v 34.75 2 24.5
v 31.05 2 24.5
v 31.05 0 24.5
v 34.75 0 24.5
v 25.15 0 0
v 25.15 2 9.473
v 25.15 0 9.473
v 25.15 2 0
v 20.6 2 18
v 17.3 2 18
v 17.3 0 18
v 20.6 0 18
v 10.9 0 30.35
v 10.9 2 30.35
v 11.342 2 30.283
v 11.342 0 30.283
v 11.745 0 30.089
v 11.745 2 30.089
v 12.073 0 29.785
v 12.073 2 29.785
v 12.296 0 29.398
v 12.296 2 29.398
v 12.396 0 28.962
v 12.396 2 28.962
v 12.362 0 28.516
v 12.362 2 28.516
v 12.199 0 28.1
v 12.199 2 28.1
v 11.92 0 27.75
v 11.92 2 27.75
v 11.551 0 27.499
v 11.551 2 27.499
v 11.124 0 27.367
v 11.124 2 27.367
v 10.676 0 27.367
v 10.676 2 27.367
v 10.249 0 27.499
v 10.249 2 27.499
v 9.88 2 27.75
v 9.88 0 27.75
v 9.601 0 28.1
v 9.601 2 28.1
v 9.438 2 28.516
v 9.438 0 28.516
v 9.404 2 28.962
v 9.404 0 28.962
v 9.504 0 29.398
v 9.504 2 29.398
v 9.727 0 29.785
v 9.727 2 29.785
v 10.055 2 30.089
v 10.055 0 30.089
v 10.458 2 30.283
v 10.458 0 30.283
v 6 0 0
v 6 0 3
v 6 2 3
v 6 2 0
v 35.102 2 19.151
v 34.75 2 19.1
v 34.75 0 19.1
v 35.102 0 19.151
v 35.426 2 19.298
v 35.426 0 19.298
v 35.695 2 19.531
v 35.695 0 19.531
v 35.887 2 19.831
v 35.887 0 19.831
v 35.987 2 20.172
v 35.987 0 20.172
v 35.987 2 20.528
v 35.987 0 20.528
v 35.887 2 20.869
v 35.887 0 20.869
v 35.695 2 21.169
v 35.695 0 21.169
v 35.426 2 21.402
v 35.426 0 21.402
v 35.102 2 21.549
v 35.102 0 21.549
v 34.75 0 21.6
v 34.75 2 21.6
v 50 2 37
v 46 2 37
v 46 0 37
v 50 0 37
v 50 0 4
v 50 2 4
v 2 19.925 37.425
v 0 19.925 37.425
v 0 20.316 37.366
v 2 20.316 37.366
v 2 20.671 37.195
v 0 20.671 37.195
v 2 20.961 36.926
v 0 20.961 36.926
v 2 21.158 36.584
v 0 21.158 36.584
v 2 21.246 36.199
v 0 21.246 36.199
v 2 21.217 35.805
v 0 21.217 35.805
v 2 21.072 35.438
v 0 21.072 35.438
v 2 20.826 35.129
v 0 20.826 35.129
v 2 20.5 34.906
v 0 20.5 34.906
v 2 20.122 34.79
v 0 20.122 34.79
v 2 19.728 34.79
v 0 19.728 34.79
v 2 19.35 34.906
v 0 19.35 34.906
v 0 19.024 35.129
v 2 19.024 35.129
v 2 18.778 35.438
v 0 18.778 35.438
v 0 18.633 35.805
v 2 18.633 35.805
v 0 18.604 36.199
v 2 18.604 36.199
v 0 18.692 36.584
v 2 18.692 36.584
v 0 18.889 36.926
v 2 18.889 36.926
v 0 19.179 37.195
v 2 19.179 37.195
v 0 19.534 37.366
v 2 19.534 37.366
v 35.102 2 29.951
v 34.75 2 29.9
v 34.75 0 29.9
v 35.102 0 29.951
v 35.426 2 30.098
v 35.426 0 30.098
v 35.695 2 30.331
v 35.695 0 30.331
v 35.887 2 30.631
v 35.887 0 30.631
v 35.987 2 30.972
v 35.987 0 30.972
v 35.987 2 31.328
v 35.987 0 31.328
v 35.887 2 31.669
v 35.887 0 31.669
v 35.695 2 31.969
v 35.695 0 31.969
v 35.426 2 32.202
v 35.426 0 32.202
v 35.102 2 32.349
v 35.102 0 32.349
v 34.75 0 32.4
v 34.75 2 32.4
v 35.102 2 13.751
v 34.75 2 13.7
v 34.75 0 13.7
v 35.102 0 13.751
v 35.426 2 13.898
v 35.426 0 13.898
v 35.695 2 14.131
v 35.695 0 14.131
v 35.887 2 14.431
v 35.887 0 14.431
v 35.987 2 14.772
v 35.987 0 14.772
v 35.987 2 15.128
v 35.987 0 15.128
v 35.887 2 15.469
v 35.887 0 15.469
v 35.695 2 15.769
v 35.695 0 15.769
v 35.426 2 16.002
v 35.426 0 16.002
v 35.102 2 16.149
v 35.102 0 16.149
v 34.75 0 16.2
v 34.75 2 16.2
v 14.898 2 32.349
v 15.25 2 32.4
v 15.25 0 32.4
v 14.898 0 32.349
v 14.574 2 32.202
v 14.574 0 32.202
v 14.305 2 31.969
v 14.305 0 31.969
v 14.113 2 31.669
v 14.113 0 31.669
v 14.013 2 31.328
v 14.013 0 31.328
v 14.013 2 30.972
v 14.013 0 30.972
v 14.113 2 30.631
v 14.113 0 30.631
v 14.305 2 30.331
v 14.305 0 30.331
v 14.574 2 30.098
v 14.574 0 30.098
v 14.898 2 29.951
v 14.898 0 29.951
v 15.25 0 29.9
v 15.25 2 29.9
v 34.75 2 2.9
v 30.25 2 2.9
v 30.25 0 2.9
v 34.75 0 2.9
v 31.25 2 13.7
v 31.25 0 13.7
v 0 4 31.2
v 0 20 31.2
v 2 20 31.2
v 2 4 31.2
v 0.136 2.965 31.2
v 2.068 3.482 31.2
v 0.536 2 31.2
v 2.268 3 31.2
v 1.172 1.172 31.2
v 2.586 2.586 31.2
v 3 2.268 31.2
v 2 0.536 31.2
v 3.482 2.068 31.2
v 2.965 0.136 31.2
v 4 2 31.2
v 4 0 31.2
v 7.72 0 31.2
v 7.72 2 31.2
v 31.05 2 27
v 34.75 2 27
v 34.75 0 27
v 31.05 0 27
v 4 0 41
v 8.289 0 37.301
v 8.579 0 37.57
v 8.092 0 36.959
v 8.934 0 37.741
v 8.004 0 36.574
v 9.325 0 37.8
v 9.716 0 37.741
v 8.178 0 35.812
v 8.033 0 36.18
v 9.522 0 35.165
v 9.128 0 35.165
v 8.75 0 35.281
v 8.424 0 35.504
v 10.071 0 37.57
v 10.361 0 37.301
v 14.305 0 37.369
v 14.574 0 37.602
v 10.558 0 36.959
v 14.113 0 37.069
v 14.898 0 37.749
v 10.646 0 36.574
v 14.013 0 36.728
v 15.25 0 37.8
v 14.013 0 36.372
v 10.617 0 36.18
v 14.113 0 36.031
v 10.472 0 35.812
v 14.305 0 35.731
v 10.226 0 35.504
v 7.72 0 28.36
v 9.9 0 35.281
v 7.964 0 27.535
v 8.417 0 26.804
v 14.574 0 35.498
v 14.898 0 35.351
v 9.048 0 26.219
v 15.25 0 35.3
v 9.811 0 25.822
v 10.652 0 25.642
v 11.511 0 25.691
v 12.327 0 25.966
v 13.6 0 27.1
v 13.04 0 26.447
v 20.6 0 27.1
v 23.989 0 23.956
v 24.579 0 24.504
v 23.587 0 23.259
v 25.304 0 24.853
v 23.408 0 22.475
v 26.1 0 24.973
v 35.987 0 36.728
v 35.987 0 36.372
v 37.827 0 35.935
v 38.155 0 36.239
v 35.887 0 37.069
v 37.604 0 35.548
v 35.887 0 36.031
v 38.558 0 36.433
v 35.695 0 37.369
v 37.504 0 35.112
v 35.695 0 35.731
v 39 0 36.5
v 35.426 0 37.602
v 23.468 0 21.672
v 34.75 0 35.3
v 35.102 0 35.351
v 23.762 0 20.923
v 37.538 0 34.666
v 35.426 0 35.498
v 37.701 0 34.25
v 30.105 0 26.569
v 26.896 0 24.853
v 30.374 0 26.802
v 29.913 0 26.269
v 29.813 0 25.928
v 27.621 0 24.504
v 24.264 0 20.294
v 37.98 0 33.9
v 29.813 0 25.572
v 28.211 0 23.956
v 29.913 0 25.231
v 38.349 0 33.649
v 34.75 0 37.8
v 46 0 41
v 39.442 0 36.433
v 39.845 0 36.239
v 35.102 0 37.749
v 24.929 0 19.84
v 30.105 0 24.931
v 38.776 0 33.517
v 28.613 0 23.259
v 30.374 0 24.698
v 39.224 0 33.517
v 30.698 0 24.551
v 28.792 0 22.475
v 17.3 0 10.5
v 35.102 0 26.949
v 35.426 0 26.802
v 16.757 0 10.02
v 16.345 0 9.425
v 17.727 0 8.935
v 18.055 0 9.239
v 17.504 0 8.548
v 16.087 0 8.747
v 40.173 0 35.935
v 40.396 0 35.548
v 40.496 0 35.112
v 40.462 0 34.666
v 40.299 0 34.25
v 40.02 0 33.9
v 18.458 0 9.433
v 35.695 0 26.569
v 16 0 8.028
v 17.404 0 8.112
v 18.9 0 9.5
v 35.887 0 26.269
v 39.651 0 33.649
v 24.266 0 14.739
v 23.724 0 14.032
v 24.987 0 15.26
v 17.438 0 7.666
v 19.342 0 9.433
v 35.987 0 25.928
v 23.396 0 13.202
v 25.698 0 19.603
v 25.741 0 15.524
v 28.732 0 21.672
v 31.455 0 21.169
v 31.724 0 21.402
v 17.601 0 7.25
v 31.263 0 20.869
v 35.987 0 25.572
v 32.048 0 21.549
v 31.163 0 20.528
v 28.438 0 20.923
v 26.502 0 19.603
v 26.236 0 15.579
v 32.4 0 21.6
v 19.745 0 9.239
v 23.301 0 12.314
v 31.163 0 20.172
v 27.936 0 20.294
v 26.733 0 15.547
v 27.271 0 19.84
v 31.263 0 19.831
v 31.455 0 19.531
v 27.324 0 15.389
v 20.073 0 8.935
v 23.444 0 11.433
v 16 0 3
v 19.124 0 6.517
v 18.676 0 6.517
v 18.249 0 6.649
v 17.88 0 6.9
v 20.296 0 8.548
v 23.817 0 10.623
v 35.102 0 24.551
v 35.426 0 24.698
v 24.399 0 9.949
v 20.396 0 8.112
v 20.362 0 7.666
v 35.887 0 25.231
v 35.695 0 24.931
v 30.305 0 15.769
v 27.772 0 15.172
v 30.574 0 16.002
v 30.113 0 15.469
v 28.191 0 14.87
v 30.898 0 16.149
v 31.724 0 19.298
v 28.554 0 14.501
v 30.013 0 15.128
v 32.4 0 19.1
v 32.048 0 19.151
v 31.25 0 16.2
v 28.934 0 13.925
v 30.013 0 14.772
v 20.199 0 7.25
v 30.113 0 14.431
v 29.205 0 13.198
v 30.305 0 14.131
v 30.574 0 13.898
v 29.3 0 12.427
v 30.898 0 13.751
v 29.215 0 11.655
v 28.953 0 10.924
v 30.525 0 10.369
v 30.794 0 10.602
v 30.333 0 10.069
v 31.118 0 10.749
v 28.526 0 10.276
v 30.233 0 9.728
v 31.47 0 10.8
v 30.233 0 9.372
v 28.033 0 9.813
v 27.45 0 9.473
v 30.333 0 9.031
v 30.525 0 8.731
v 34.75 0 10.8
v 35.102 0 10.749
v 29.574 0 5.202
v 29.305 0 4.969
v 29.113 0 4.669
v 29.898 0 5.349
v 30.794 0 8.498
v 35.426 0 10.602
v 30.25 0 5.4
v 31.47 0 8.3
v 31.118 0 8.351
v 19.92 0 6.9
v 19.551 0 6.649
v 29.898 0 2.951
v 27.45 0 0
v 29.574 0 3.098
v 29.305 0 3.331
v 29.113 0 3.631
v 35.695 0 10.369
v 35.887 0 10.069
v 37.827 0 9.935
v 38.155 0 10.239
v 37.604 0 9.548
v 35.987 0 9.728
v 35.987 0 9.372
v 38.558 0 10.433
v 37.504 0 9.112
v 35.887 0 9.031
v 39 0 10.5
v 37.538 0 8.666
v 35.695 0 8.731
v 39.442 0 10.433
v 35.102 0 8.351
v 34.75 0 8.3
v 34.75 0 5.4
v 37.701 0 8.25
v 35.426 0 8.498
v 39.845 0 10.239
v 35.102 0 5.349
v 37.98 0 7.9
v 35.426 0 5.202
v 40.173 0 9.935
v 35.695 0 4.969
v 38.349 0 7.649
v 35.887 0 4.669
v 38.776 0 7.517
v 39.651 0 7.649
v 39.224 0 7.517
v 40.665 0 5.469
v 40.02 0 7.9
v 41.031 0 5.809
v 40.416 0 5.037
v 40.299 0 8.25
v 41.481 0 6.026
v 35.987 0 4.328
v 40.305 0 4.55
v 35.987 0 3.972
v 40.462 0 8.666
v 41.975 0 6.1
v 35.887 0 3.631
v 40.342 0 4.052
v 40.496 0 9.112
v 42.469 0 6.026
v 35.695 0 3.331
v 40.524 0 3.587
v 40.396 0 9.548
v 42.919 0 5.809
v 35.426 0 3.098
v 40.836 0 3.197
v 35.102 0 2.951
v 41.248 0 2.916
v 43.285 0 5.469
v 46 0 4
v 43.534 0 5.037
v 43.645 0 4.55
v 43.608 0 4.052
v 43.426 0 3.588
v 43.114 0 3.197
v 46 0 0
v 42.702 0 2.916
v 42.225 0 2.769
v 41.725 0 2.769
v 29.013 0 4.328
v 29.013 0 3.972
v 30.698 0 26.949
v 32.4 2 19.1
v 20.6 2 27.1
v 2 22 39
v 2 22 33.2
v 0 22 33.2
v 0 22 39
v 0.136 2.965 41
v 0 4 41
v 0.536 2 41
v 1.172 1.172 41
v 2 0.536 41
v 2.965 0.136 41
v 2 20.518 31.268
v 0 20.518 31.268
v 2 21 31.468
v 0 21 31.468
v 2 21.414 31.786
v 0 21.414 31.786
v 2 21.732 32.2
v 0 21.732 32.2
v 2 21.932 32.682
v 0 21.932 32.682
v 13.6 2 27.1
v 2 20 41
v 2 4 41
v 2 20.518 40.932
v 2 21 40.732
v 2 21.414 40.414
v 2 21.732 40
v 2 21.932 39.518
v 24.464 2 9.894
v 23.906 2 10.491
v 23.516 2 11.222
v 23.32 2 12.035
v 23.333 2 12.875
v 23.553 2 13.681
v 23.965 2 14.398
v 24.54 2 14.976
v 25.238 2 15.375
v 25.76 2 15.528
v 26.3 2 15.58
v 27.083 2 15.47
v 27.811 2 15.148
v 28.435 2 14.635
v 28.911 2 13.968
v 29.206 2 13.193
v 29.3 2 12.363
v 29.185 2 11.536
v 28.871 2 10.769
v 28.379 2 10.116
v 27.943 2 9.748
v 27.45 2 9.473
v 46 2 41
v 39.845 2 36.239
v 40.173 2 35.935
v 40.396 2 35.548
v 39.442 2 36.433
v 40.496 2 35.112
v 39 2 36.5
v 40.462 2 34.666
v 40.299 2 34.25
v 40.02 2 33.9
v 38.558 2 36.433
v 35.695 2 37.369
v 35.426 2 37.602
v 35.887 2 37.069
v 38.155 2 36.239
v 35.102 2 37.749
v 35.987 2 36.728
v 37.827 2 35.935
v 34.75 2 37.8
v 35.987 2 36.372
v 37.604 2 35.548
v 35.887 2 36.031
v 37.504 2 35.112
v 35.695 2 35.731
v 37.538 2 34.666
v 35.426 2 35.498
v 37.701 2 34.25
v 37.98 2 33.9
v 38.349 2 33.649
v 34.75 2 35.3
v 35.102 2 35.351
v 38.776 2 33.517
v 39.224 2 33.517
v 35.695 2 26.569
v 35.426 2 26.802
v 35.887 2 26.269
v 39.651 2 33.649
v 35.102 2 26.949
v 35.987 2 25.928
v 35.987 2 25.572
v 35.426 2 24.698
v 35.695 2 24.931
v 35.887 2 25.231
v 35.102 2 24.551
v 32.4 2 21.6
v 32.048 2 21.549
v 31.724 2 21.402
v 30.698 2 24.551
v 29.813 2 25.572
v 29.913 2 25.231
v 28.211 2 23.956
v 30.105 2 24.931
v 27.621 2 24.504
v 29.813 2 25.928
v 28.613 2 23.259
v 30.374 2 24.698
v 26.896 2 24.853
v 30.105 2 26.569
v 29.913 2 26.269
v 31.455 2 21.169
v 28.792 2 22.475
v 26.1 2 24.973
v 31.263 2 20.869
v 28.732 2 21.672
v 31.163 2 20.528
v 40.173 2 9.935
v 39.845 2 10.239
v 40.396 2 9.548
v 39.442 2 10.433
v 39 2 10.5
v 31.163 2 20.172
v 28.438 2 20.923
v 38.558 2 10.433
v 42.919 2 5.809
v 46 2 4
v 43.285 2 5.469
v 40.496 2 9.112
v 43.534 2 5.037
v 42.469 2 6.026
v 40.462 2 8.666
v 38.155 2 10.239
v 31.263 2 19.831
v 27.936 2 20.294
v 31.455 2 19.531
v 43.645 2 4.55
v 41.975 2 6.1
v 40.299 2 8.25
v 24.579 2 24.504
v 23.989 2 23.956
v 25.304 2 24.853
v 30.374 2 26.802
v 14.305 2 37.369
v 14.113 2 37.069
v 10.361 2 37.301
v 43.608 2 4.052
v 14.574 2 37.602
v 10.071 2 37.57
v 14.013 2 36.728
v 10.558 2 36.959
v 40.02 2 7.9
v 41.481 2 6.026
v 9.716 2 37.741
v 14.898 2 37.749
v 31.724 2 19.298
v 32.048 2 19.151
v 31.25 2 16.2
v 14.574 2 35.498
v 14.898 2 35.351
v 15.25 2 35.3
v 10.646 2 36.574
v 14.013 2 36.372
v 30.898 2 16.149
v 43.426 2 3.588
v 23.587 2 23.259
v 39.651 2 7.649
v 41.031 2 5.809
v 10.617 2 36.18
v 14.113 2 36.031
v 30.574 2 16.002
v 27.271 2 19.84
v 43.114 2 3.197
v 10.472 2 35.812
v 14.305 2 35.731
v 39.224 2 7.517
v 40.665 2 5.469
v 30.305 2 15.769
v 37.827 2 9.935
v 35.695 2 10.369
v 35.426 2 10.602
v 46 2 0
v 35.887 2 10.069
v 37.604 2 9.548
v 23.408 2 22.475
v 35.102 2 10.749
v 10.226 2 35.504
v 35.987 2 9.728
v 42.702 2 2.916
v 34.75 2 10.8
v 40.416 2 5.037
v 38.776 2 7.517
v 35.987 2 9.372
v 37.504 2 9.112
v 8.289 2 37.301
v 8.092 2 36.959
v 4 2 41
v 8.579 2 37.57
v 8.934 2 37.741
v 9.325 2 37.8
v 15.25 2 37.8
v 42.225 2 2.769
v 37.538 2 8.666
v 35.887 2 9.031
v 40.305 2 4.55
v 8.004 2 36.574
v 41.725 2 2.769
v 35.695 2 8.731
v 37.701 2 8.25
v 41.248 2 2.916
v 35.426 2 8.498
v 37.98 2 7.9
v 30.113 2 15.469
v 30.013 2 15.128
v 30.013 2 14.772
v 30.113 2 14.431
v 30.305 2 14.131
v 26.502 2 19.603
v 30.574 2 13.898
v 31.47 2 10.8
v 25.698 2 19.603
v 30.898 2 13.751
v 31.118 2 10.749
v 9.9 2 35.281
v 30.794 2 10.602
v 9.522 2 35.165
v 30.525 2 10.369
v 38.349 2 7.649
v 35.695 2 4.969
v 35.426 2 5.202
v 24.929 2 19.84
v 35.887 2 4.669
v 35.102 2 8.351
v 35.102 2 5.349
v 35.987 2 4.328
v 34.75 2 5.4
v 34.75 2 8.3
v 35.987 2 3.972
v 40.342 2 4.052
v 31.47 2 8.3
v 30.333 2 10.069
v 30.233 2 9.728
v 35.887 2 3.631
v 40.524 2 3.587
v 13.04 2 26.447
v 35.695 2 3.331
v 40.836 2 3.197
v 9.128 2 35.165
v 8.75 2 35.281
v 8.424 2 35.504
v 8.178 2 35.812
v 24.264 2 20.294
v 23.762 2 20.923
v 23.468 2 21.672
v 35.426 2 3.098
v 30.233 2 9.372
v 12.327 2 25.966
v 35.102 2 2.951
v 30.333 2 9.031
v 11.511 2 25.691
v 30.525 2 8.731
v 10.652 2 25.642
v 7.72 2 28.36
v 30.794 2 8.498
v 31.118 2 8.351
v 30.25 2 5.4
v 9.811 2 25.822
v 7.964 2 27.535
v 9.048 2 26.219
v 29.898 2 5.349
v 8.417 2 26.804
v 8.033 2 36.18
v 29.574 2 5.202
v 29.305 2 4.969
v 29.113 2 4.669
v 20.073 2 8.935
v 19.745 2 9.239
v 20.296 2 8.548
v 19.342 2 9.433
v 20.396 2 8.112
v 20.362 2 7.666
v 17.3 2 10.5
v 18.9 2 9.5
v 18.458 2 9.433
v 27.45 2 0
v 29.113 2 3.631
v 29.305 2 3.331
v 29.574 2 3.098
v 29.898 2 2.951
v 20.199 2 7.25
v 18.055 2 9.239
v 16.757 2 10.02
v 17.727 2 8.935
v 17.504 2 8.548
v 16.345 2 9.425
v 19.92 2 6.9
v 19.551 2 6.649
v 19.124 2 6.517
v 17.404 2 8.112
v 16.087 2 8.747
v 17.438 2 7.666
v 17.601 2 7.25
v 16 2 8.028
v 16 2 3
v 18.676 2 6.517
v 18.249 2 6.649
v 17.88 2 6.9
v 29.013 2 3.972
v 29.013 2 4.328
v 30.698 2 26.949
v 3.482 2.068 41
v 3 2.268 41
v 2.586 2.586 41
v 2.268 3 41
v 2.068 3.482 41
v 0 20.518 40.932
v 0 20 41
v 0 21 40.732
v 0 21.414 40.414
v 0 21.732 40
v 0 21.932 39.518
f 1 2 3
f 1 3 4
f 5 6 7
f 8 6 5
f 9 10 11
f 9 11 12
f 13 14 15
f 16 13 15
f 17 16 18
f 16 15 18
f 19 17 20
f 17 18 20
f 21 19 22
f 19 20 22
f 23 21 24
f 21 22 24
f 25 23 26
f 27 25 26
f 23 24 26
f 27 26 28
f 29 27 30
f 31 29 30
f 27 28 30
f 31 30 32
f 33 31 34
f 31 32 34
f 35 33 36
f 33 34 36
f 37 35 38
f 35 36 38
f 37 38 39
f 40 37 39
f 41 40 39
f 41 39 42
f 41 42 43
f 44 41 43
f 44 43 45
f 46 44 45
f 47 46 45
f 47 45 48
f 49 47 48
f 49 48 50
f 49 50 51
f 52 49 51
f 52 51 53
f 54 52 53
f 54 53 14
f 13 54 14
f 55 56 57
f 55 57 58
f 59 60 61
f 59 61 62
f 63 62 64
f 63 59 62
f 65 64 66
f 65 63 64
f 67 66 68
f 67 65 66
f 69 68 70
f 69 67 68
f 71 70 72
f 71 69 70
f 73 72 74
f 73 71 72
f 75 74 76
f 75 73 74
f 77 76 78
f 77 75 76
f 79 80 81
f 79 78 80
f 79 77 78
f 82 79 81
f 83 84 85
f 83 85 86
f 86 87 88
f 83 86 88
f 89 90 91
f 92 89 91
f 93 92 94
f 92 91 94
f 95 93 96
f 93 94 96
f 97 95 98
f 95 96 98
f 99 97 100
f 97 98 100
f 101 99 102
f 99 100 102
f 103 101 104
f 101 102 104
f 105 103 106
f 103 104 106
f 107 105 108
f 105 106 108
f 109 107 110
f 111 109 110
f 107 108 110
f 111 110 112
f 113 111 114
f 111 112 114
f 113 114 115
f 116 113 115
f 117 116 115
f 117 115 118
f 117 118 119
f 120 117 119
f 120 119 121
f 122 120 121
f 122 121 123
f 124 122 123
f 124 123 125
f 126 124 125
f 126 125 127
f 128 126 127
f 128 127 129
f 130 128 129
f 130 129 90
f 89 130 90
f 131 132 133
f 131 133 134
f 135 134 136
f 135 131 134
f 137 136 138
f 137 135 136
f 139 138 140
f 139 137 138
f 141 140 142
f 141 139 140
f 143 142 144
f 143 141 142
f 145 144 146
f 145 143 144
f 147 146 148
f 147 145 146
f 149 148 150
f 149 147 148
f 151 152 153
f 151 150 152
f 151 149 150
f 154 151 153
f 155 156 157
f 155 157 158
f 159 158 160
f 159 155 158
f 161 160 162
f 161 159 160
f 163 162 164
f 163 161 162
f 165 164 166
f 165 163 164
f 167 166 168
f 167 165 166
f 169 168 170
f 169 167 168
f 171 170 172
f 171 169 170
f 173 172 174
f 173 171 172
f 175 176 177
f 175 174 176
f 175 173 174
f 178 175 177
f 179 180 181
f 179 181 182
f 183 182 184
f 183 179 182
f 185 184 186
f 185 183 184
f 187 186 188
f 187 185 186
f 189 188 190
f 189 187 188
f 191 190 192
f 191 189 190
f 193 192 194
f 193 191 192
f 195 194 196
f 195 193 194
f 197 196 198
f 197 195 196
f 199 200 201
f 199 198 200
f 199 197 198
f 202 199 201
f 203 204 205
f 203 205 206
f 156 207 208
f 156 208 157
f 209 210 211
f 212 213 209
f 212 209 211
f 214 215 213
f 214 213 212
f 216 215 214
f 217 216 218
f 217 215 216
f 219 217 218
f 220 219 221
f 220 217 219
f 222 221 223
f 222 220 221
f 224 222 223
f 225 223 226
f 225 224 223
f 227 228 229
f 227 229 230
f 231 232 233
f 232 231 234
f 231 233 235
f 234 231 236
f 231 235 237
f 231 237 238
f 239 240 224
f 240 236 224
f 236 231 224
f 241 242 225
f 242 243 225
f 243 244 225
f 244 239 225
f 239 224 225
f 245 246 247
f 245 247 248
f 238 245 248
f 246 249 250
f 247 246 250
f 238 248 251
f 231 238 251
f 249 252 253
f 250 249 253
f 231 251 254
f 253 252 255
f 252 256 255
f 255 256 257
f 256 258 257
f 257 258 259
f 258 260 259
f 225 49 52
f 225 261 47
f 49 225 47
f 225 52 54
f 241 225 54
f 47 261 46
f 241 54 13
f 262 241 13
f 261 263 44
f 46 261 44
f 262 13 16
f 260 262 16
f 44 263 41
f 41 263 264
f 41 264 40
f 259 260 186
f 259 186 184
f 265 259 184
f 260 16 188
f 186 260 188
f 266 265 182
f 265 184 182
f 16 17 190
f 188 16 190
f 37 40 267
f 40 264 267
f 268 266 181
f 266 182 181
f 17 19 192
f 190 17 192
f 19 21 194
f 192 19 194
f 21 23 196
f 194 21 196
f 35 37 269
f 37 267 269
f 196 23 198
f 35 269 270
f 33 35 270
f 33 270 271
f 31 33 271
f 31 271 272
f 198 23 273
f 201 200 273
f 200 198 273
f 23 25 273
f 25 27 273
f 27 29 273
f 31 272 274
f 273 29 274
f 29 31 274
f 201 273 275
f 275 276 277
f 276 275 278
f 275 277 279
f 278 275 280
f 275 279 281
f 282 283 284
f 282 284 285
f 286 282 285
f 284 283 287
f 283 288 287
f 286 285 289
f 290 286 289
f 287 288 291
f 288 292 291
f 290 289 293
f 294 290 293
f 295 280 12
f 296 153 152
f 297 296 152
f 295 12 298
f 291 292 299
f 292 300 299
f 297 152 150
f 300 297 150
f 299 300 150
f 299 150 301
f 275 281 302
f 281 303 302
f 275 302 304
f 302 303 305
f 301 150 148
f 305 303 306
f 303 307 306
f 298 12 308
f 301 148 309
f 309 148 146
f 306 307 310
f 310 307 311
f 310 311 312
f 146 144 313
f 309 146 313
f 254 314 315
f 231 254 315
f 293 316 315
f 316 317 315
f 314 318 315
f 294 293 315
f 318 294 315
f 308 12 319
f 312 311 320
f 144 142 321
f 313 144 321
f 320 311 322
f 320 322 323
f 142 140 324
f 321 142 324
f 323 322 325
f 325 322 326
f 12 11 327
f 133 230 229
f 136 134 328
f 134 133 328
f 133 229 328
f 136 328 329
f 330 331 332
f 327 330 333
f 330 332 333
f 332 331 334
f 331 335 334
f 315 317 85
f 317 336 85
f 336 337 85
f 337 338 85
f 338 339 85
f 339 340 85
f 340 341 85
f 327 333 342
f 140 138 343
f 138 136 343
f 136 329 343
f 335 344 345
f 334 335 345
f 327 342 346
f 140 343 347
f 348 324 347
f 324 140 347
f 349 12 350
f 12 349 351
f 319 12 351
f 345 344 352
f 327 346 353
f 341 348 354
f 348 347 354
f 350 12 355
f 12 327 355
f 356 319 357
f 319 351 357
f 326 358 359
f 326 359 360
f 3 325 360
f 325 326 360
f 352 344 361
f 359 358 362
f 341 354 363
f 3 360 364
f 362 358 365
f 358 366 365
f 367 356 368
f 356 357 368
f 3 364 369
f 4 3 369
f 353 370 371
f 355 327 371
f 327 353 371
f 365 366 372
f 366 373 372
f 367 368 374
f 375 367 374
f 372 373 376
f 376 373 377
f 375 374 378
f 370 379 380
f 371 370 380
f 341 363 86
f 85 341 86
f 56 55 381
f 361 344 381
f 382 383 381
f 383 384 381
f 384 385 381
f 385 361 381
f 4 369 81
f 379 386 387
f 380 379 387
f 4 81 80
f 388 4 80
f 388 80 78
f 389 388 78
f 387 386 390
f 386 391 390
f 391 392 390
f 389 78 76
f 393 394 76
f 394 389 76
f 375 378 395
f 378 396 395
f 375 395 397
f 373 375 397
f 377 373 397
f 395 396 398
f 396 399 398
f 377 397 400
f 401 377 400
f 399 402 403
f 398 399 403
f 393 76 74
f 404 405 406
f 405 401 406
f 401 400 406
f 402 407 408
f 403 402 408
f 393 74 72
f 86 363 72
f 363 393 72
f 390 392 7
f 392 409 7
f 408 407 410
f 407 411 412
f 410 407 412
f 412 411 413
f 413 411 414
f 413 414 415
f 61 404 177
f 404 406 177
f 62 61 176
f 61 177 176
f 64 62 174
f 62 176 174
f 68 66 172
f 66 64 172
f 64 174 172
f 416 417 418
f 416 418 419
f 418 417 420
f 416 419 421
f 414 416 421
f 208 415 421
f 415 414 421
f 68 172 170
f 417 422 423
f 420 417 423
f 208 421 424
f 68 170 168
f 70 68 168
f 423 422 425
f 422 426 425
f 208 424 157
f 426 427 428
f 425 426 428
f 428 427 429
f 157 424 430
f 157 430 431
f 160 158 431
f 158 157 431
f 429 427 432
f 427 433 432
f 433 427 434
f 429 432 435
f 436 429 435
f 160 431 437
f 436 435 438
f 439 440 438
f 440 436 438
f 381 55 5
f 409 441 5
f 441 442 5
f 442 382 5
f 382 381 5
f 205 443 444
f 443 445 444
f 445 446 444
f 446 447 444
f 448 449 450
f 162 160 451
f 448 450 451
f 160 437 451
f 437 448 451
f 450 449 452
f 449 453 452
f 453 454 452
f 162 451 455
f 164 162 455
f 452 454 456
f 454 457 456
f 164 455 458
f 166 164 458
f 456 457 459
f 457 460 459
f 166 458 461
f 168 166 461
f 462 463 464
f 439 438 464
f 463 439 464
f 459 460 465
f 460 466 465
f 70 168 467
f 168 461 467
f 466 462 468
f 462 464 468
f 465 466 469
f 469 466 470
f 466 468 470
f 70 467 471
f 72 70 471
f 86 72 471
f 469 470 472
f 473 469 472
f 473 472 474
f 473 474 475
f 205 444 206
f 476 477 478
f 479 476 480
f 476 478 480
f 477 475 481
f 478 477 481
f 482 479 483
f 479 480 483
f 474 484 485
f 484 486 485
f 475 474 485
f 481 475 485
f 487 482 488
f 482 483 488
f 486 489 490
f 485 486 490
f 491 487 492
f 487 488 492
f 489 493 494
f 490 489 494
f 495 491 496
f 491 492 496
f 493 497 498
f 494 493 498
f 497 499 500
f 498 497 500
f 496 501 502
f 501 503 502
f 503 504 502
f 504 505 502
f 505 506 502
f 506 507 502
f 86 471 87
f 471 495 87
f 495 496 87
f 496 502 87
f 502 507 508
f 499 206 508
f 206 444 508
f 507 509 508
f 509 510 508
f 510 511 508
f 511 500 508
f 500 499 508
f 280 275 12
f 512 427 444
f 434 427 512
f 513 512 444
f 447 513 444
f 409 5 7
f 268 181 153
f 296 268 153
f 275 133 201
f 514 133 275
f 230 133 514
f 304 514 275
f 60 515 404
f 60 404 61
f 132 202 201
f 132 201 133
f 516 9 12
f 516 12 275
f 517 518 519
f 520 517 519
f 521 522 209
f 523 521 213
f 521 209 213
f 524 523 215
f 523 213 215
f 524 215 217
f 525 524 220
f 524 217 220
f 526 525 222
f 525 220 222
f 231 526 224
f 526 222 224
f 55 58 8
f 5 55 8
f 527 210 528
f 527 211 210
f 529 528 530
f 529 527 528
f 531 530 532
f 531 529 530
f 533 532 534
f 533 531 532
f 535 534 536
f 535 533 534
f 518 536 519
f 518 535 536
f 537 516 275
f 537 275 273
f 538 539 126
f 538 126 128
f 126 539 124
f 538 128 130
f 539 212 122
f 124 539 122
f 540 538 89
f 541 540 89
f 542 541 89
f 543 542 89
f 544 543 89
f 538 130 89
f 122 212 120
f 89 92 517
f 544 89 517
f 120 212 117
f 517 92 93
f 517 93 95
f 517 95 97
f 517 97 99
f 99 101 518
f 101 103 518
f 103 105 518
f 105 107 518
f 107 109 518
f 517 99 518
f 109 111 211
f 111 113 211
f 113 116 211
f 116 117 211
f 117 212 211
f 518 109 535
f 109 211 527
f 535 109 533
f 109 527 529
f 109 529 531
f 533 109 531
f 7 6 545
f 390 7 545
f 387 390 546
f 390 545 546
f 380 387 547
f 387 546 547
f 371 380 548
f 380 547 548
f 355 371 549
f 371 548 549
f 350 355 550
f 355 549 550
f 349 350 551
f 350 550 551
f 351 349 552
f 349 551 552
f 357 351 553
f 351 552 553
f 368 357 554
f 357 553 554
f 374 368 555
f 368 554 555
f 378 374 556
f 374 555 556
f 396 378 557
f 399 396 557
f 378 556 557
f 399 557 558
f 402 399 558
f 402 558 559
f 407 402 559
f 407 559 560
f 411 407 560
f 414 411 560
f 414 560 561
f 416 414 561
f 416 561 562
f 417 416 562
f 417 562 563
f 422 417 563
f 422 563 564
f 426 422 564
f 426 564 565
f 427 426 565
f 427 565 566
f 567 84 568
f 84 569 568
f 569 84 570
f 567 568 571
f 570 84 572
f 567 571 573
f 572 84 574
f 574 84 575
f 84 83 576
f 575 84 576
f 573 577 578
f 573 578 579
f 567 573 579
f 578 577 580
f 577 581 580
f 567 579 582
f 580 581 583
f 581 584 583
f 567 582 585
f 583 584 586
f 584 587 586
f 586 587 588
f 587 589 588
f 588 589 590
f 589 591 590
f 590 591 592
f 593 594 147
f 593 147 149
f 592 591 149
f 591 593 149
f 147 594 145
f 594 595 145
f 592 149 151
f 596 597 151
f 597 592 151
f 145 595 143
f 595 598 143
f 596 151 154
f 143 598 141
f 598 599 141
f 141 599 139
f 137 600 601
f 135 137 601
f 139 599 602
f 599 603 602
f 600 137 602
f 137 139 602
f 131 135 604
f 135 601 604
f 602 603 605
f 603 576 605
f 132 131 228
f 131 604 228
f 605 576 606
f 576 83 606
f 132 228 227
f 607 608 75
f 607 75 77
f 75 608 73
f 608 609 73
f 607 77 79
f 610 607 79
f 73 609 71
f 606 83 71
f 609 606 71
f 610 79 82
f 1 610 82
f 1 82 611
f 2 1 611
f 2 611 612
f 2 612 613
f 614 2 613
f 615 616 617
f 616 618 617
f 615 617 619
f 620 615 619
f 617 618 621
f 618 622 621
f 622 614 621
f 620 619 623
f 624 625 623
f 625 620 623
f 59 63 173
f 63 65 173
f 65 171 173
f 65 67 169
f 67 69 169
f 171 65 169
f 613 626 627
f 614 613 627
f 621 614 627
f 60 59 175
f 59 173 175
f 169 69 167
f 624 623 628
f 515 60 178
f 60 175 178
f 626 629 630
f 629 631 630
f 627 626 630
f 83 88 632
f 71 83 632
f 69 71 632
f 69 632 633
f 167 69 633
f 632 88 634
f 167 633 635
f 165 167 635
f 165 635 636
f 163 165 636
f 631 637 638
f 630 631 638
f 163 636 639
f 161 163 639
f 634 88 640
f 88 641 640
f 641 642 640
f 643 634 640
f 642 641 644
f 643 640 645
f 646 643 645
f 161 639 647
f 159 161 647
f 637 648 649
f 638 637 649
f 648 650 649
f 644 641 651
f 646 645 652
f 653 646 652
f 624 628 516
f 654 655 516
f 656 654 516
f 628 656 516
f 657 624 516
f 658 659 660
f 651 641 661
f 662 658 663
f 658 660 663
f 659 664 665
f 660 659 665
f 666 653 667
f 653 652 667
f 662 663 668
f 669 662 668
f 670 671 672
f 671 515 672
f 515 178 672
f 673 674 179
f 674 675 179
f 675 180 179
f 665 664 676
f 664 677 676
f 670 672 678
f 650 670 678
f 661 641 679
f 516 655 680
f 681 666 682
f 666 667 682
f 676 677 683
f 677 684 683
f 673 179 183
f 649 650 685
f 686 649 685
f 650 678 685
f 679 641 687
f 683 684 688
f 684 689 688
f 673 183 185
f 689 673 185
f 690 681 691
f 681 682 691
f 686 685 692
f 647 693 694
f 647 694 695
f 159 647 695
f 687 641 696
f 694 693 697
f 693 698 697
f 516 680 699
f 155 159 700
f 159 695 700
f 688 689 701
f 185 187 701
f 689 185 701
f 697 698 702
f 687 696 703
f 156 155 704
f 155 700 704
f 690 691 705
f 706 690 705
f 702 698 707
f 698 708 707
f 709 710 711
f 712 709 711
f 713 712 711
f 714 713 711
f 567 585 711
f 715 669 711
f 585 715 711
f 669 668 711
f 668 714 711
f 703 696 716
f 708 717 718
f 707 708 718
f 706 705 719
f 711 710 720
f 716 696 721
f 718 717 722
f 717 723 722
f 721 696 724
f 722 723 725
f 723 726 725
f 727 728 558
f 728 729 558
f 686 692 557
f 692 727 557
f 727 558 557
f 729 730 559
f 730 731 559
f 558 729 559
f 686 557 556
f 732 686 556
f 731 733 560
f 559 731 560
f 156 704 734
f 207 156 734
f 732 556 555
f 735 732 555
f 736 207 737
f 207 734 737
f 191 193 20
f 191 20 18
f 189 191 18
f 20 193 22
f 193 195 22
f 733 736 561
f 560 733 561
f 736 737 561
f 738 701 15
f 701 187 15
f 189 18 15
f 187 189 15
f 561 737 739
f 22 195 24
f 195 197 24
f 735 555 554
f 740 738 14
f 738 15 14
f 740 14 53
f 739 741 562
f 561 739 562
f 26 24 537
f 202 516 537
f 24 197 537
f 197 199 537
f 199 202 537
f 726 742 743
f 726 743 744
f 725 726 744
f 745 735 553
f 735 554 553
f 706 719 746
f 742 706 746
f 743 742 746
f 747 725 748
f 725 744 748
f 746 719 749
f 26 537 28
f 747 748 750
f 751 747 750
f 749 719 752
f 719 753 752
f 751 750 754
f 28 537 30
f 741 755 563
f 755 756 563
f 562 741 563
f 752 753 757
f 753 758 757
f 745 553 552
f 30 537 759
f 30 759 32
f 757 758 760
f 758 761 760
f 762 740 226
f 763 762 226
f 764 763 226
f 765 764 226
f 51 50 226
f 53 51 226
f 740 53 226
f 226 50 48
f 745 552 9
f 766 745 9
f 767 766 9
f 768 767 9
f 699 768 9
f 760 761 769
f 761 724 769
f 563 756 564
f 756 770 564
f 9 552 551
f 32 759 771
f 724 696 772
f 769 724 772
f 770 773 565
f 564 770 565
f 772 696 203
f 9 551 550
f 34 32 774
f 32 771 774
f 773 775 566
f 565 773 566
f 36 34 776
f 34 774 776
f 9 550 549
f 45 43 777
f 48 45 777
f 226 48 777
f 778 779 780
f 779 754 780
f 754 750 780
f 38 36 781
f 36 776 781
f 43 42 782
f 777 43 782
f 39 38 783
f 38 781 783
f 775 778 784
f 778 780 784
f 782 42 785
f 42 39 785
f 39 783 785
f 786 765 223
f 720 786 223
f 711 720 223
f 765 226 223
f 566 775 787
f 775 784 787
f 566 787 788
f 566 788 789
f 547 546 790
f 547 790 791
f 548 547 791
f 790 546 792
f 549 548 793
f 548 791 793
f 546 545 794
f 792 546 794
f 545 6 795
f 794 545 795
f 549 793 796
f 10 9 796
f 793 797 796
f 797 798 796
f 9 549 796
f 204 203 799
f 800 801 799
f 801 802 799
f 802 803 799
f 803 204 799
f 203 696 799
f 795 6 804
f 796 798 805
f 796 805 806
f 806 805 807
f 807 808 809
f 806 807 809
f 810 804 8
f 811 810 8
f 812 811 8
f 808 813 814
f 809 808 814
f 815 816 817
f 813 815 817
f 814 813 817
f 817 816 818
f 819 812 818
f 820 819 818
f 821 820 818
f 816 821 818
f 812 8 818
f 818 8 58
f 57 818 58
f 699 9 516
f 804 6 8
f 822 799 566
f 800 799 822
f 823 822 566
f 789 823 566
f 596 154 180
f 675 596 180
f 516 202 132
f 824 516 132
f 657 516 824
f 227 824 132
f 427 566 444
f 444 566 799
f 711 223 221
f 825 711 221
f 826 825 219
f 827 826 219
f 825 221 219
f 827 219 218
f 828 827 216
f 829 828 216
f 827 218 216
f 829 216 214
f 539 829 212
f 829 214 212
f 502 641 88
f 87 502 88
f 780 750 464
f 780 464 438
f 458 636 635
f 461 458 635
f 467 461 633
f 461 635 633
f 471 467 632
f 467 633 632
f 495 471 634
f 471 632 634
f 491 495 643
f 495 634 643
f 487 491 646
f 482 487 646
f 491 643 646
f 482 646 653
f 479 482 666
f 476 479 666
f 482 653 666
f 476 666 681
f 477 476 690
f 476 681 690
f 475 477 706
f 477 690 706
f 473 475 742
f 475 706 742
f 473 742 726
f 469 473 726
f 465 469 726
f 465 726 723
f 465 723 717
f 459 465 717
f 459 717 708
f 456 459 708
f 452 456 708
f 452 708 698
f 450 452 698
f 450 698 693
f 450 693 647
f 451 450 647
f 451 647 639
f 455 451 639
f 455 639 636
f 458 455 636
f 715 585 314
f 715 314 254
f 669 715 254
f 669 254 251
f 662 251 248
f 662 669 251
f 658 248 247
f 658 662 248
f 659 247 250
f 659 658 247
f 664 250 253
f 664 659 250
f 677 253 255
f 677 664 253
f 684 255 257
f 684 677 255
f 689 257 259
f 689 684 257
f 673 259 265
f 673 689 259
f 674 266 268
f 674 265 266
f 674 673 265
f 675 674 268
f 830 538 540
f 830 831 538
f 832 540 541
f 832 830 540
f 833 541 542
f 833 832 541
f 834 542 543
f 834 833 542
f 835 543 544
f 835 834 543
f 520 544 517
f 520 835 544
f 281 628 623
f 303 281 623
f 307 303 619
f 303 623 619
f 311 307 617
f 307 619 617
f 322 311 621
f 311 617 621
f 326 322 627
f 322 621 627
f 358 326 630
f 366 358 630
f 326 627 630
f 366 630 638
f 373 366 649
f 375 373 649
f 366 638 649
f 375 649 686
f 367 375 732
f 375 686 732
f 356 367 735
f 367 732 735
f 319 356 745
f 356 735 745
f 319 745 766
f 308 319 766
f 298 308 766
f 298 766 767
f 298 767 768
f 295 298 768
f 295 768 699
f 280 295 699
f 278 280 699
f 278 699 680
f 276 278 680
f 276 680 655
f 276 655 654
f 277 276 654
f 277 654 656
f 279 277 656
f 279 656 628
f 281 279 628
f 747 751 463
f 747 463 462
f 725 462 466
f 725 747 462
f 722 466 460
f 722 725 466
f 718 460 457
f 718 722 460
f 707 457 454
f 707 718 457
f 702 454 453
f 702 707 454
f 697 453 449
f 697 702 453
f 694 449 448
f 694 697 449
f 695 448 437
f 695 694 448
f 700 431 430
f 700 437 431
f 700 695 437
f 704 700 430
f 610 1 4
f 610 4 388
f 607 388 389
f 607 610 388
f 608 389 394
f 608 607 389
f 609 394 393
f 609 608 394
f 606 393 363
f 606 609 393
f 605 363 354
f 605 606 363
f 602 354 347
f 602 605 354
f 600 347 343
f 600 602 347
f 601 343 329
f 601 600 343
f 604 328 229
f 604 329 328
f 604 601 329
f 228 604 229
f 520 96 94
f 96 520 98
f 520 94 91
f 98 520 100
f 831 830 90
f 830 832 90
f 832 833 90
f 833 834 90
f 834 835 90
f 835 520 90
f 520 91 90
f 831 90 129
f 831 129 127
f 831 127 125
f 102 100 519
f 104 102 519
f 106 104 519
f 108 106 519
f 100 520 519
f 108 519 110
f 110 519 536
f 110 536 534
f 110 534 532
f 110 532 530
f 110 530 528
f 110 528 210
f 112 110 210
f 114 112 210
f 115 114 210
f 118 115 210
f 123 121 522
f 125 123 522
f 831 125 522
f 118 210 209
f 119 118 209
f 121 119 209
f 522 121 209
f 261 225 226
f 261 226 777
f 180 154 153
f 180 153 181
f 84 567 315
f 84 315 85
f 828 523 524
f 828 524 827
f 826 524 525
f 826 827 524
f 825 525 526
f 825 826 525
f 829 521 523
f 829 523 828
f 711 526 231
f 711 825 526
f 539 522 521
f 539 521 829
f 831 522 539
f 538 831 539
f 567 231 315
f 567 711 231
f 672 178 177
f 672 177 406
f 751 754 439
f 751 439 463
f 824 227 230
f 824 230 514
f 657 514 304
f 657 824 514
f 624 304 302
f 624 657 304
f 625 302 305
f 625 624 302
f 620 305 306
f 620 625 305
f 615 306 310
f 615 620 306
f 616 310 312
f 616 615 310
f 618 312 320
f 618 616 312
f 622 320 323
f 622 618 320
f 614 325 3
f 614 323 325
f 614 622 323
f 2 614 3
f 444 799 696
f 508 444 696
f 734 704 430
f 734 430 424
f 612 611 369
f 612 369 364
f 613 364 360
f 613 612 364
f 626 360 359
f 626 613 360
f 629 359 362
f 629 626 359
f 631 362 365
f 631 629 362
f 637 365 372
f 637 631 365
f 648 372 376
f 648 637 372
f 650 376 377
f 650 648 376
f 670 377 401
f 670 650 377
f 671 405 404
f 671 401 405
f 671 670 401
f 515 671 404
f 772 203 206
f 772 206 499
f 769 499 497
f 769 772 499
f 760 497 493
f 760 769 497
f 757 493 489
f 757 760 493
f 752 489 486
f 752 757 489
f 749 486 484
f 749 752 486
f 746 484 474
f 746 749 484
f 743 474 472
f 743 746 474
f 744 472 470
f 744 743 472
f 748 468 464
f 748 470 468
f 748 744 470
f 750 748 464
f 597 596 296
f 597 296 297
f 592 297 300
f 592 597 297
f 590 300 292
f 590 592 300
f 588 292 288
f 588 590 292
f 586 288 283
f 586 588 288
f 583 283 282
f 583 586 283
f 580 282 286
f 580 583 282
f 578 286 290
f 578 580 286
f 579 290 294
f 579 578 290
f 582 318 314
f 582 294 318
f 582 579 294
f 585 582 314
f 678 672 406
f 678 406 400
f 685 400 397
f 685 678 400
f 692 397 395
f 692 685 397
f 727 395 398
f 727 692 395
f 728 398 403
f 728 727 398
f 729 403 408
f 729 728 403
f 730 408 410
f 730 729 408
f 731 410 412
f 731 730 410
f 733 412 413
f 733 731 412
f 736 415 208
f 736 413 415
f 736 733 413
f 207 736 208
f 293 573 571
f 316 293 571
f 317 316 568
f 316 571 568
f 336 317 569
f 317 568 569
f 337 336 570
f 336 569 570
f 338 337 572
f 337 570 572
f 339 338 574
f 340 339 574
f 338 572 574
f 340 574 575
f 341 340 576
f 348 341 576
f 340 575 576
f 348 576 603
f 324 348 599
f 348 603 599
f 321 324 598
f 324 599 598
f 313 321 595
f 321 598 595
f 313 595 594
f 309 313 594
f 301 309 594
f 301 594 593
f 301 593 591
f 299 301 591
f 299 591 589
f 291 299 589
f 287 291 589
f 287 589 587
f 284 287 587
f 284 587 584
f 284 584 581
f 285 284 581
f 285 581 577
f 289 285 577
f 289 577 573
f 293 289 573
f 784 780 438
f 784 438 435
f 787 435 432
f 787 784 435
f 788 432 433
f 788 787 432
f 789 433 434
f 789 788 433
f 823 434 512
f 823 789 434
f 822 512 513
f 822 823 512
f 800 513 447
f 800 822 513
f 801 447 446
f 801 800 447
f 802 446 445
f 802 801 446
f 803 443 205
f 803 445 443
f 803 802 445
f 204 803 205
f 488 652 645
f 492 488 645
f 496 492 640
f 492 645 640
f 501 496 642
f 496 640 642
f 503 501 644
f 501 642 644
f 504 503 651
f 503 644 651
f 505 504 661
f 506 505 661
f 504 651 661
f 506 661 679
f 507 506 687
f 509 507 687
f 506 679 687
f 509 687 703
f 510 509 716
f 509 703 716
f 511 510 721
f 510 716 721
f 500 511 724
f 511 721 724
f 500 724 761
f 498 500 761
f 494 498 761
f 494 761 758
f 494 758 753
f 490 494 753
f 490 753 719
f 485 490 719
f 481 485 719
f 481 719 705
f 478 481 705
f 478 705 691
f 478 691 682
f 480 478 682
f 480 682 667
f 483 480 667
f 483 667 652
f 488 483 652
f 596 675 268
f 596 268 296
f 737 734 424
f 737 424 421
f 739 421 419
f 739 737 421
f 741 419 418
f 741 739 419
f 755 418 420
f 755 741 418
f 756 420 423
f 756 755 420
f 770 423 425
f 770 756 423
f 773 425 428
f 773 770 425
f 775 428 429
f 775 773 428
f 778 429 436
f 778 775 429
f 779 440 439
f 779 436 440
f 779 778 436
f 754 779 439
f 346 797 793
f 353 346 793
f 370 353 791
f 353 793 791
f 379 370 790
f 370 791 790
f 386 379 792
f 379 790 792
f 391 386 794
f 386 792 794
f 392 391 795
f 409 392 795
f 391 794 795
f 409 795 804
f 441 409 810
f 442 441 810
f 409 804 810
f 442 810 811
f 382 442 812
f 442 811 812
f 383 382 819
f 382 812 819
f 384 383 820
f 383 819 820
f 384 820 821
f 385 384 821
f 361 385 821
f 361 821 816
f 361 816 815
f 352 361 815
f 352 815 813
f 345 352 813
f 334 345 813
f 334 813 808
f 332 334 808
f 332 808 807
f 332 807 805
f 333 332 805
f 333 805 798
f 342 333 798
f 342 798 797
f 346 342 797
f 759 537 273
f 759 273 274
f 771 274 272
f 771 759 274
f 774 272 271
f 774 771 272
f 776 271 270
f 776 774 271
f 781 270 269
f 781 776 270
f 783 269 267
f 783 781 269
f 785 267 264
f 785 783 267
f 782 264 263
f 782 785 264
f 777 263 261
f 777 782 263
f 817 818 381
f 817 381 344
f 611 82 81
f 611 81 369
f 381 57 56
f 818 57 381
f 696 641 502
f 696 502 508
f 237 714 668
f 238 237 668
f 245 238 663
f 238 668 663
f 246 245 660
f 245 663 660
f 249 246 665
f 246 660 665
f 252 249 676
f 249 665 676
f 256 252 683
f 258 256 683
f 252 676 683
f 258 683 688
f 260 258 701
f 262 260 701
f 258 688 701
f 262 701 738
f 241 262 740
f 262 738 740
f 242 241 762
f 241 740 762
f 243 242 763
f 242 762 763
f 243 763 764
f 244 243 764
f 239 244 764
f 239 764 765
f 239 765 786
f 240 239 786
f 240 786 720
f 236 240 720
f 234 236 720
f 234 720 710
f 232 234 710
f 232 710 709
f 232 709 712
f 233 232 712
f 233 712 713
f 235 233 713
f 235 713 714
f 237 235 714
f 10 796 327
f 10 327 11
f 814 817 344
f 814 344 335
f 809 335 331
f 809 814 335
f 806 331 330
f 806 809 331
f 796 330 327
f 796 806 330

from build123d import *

# Parameters (mm, degrees)
SM_BASE_FLANGE_1_DEPTH   = 41
SKETCH_6_W               = 4
SKETCH_6_H               = 4
CUT_EXTRUDE_1_DEPTH      = 10
SKETCH_7_R               = 1.5
SKETCH_7_R_2             = 1.675
CUT_EXTRUDE_2_DEPTH      = 68.683085036
CUT_EXTRUDE_3_DEPTH      = 10
SKETCH_9_R               = 1.325
SKETCH_9_R_2             = 1.5
CUT_EXTRUDE_4_DEPTH      = 10
CUT_EXTRUDE_5_DEPTH      = 68.683085036
CUT_EXTRUDE_5_DEPTH_BACK = 68.683085036
SKETCH_10_W              = 7.72
SKETCH_10_H              = 10
CUT_EXTRUDE_6_DEPTH      = 68.683085036
CUT_EXTRUDE_6_DEPTH_BACK = 68.683085036
SKETCH_11_W              = 6
SKETCH_11_H              = 21.2
CUT_EXTRUDE_7_DEPTH      = 10
SKETCH_14_RX             = 3.175
SKETCH_14_RY             = 3
CUT_EXTRUDE_8_DEPTH      = 10
SKETCH_15_W              = 2.3
SKETCH_15_H              = 10
CUT_EXTRUDE_9_DEPTH      = 10
SKETCH_16_R              = 2.7
CUT_EXTRUDE_10_DEPTH     = 10
FILLET_1_R               = 2
SKETCH_17_R              = 1.325
CUT_EXTRUDE_11_DEPTH     = 10


# Sheet-metal steps are written as plain solids
with BuildPart() as part:
    # Sketch 1 → Базовая кромка1 (new body)
    with BuildSketch(Plane.XY):
        with BuildLine():
            Line((0, 22), (0, 4))
            ThreePointArc((0, 4), (1.171572875, 1.171572875), (4, 0))
            Line((4, 0), (50, 0))
            Line((50, 0), (50, 2))
            Line((50, 2), (4, 2))
            ThreePointArc((4, 2), (2.585786438, 2.585786438), (2, 4))
            Line((2, 4), (2, 22))
            Line((2, 22), (0, 22))
        make_face()
    extrude(amount=SM_BASE_FLANGE_1_DEPTH)

    # Эскиз6 → Вырез-Вытянуть1 (cut)
    with BuildSketch(Plane(origin=(0, 2, 0), x_dir=(1, 0, 0), z_dir=(0, 1, 0))):
        with Locations((48, -39)):
            Rectangle(SKETCH_6_W, SKETCH_6_H)
        with Locations((48, -2)):
            Rectangle(SKETCH_6_W, SKETCH_6_H)
    extrude(amount=-CUT_EXTRUDE_1_DEPTH, mode=Mode.SUBTRACT)

    # Эскиз7 → Вырез-Вытянуть2 (cut, through all)
    with BuildSketch(Plane(origin=(0, 2, 0), x_dir=(1, 0, 0), z_dir=(0, 1, 0))):
        with Locations(Location((39, -35, 0), (0, 0, 270))):
            Circle(SKETCH_7_R)
        with Locations(Location((39, -9, 0), (0, 0, 270))):
            Circle(SKETCH_7_R)
        with Locations(Location((41.975, -4.425, 0), (0, 0, 270))):
            Circle(SKETCH_7_R_2)
    extrude(amount=-CUT_EXTRUDE_2_DEPTH, mode=Mode.SUBTRACT)

    # Эскиз8 → Вырез-Вытянуть3 (cut)
    with BuildSketch(Plane(origin=(0, 2, 0), x_dir=(1, 0, 0), z_dir=(0, 1, 0))):
        with BuildLine():
            Line((34.75, -5.4), (30.25, -5.4))
            ThreePointArc((30.25, -5.4), (29, -4.15), (30.25, -2.9))
            Line((30.25, -2.9), (34.75, -2.9))
            ThreePointArc((34.75, -2.9), (36, -4.15), (34.75, -5.4))
        make_face()
        with BuildLine():
            Line((31.47, -8.3), (34.75, -8.3))
            ThreePointArc((34.75, -8.3), (36, -9.55), (34.75, -10.8))
            Line((34.75, -10.8), (31.47, -10.8))
            ThreePointArc((31.47, -10.8), (30.22, -9.55), (31.47, -8.3))
        make_face()
        with BuildLine():
            Line((31.25, -13.7), (34.75, -13.7))
            ThreePointArc((34.75, -13.7), (36, -14.95), (34.75, -16.2))
            Line((34.75, -16.2), (31.25, -16.2))
            ThreePointArc((31.25, -16.2), (30, -14.95), (31.25, -13.7))
        make_face()
        with BuildLine():
            Line((32.4, -19.1), (34.75, -19.1))
            ThreePointArc((34.75, -19.1), (36, -20.35), (34.75, -21.6))
            Line((34.75, -21.6), (32.4, -21.6))
            ThreePointArc((32.4, -21.6), (31.15, -20.35), (32.4, -19.1))
        make_face()
        with BuildLine():
            Line((31.05, -24.5), (34.75, -24.5))
            ThreePointArc((34.75, -24.5), (36, -25.75), (34.75, -27))
            Line((34.75, -27), (31.05, -27))
            ThreePointArc((31.05, -27), (29.8, -25.75), (31.05, -24.5))
        make_face()
        with BuildLine():
            Line((34.75, -32.4), (15.25, -32.4))
            ThreePointArc((15.25, -32.4), (14, -31.15), (15.25, -29.9))
            Line((15.25, -29.9), (34.75, -29.9))
            ThreePointArc((34.75, -29.9), (36, -31.15), (34.75, -32.4))
        make_face()
        with BuildLine():
            Line((15.25, -35.3), (34.75, -35.3))
            ThreePointArc((34.75, -35.3), (36, -36.55), (34.75, -37.8))
            Line((34.75, -37.8), (15.25, -37.8))
            ThreePointArc((15.25, -37.8), (14, -36.55), (15.25, -35.3))
        make_face()
    extrude(amount=-CUT_EXTRUDE_3_DEPTH, mode=Mode.SUBTRACT)

    # Эскиз9 → Вырез-Вытянуть4 (cut)
    with BuildSketch(Plane(origin=(0, 2, 0), x_dir=(1, 0, 0), z_dir=(0, 1, 0))):
        with Locations(Location((9.325, -36.475, 0), (0, 0, 270))):
            Circle(SKETCH_9_R)
        with Locations(Location((10.9, -28.85, 0), (0, 0, 270))):
            Circle(SKETCH_9_R_2)
        with Locations(Location((18.9, -8, 0), (0, 0, 270))):
            Circle(SKETCH_9_R_2)
    extrude(amount=-CUT_EXTRUDE_4_DEPTH, mode=Mode.SUBTRACT)

    # Эскиз10 → Вырез-Вытянуть5 (cut, two sides: drawn at the far end of the back side and taken through both)
    with BuildSketch(Plane(origin=(0, 2, 0), x_dir=(1, 0, 0), z_dir=(0, 1, 0)).offset(-CUT_EXTRUDE_5_DEPTH_BACK)):
        with Locations((3.86, -26.2)):
            Rectangle(SKETCH_10_W, SKETCH_10_H)
    extrude(amount=CUT_EXTRUDE_5_DEPTH + CUT_EXTRUDE_5_DEPTH_BACK, mode=Mode.SUBTRACT)

    # Эскиз11 → Вырез-Вытянуть6 (cut, two sides: drawn at the far end of the back side and taken through both)
    with BuildSketch(Plane(origin=(0, 2, 0), x_dir=(1, 0, 0), z_dir=(0, 1, 0)).offset(-CUT_EXTRUDE_6_DEPTH_BACK)):
        with Locations((3, -10.6)):
            Rectangle(SKETCH_11_W, SKETCH_11_H)
    extrude(amount=CUT_EXTRUDE_6_DEPTH + CUT_EXTRUDE_6_DEPTH_BACK, mode=Mode.SUBTRACT)

    # Эскиз12 → Вырез-Вытянуть7 (cut)
    with BuildSketch(Plane(origin=(0, 2, 0), x_dir=(1, 0, 0), z_dir=(0, 1, 0))):
        with BuildLine():
            Line((6, -3), (16, -3))
            Line((16, -3), (16, -8.028158581))
            ThreePointArc((16, -8.028158581), (16.344816391, -9.424582586), (17.3, -10.5))
            Line((17.3, -10.5), (17.3, -18))
            Line((17.3, -18), (20.6, -18))
            Line((20.6, -18), (20.6, -27.1))
            Line((20.6, -27.1), (13.6, -27.1))
            ThreePointArc((13.6, -27.1), (10.225833848, -25.703891292), (7.72, -28.36))
            Line((7.72, -28.36), (0.805596241, -28.36))
            Line((0.805596241, -28.36), (0.805596241, -3))
            Line((0.805596241, -3), (6, -3))
        make_face()
    extrude(amount=-CUT_EXTRUDE_7_DEPTH, mode=Mode.SUBTRACT)

    # Эскиз14 → Вырез-Вытянуть8 (cut)
    with BuildSketch(Plane(origin=(0, 2, 0), x_dir=(1, 0, 0), z_dir=(0, 1, 0))):
        with Locations(Location((26.3, -12.405), (0, 0, -90))):
            Ellipse(SKETCH_14_RX, SKETCH_14_RY)
    extrude(amount=-CUT_EXTRUDE_8_DEPTH, mode=Mode.SUBTRACT)

    # Эскиз15 → Вырез-Вытянуть9 (cut)
    with BuildSketch(Plane(origin=(0, 2, 0), x_dir=(1, 0, 0), z_dir=(0, 1, 0))):
        with Locations((26.3, -5)):
            Rectangle(SKETCH_15_W, SKETCH_15_H)
    extrude(amount=-CUT_EXTRUDE_9_DEPTH, mode=Mode.SUBTRACT)

    # Эскиз16 → Вырез-Вытянуть10 (cut)
    with BuildSketch(Plane(origin=(0, 2, 0), x_dir=(1, 0, 0), z_dir=(0, 1, 0))):
        with Locations(Location((26.1, -22.272936587, 0), (0, 0, 270))):
            Circle(SKETCH_16_R)
    extrude(amount=-CUT_EXTRUDE_10_DEPTH, mode=Mode.SUBTRACT)

    # Скругление1
    fillet_1_edges = [part.edges().sort_by_distance(p)[0] for p in [
        (1, 22, 31.2),
        (1, 22, 41),
    ]]
    fillet(fillet_1_edges, radius=FILLET_1_R)

    # Эскиз17 → Вырез-Вытянуть11 (cut)
    with BuildSketch(Plane.ZY):
        with Locations((36.1, 19.925)):
            Circle(SKETCH_17_R)
    extrude(amount=-CUT_EXTRUDE_11_DEPTH, mode=Mode.SUBTRACT)


solid = part.part
